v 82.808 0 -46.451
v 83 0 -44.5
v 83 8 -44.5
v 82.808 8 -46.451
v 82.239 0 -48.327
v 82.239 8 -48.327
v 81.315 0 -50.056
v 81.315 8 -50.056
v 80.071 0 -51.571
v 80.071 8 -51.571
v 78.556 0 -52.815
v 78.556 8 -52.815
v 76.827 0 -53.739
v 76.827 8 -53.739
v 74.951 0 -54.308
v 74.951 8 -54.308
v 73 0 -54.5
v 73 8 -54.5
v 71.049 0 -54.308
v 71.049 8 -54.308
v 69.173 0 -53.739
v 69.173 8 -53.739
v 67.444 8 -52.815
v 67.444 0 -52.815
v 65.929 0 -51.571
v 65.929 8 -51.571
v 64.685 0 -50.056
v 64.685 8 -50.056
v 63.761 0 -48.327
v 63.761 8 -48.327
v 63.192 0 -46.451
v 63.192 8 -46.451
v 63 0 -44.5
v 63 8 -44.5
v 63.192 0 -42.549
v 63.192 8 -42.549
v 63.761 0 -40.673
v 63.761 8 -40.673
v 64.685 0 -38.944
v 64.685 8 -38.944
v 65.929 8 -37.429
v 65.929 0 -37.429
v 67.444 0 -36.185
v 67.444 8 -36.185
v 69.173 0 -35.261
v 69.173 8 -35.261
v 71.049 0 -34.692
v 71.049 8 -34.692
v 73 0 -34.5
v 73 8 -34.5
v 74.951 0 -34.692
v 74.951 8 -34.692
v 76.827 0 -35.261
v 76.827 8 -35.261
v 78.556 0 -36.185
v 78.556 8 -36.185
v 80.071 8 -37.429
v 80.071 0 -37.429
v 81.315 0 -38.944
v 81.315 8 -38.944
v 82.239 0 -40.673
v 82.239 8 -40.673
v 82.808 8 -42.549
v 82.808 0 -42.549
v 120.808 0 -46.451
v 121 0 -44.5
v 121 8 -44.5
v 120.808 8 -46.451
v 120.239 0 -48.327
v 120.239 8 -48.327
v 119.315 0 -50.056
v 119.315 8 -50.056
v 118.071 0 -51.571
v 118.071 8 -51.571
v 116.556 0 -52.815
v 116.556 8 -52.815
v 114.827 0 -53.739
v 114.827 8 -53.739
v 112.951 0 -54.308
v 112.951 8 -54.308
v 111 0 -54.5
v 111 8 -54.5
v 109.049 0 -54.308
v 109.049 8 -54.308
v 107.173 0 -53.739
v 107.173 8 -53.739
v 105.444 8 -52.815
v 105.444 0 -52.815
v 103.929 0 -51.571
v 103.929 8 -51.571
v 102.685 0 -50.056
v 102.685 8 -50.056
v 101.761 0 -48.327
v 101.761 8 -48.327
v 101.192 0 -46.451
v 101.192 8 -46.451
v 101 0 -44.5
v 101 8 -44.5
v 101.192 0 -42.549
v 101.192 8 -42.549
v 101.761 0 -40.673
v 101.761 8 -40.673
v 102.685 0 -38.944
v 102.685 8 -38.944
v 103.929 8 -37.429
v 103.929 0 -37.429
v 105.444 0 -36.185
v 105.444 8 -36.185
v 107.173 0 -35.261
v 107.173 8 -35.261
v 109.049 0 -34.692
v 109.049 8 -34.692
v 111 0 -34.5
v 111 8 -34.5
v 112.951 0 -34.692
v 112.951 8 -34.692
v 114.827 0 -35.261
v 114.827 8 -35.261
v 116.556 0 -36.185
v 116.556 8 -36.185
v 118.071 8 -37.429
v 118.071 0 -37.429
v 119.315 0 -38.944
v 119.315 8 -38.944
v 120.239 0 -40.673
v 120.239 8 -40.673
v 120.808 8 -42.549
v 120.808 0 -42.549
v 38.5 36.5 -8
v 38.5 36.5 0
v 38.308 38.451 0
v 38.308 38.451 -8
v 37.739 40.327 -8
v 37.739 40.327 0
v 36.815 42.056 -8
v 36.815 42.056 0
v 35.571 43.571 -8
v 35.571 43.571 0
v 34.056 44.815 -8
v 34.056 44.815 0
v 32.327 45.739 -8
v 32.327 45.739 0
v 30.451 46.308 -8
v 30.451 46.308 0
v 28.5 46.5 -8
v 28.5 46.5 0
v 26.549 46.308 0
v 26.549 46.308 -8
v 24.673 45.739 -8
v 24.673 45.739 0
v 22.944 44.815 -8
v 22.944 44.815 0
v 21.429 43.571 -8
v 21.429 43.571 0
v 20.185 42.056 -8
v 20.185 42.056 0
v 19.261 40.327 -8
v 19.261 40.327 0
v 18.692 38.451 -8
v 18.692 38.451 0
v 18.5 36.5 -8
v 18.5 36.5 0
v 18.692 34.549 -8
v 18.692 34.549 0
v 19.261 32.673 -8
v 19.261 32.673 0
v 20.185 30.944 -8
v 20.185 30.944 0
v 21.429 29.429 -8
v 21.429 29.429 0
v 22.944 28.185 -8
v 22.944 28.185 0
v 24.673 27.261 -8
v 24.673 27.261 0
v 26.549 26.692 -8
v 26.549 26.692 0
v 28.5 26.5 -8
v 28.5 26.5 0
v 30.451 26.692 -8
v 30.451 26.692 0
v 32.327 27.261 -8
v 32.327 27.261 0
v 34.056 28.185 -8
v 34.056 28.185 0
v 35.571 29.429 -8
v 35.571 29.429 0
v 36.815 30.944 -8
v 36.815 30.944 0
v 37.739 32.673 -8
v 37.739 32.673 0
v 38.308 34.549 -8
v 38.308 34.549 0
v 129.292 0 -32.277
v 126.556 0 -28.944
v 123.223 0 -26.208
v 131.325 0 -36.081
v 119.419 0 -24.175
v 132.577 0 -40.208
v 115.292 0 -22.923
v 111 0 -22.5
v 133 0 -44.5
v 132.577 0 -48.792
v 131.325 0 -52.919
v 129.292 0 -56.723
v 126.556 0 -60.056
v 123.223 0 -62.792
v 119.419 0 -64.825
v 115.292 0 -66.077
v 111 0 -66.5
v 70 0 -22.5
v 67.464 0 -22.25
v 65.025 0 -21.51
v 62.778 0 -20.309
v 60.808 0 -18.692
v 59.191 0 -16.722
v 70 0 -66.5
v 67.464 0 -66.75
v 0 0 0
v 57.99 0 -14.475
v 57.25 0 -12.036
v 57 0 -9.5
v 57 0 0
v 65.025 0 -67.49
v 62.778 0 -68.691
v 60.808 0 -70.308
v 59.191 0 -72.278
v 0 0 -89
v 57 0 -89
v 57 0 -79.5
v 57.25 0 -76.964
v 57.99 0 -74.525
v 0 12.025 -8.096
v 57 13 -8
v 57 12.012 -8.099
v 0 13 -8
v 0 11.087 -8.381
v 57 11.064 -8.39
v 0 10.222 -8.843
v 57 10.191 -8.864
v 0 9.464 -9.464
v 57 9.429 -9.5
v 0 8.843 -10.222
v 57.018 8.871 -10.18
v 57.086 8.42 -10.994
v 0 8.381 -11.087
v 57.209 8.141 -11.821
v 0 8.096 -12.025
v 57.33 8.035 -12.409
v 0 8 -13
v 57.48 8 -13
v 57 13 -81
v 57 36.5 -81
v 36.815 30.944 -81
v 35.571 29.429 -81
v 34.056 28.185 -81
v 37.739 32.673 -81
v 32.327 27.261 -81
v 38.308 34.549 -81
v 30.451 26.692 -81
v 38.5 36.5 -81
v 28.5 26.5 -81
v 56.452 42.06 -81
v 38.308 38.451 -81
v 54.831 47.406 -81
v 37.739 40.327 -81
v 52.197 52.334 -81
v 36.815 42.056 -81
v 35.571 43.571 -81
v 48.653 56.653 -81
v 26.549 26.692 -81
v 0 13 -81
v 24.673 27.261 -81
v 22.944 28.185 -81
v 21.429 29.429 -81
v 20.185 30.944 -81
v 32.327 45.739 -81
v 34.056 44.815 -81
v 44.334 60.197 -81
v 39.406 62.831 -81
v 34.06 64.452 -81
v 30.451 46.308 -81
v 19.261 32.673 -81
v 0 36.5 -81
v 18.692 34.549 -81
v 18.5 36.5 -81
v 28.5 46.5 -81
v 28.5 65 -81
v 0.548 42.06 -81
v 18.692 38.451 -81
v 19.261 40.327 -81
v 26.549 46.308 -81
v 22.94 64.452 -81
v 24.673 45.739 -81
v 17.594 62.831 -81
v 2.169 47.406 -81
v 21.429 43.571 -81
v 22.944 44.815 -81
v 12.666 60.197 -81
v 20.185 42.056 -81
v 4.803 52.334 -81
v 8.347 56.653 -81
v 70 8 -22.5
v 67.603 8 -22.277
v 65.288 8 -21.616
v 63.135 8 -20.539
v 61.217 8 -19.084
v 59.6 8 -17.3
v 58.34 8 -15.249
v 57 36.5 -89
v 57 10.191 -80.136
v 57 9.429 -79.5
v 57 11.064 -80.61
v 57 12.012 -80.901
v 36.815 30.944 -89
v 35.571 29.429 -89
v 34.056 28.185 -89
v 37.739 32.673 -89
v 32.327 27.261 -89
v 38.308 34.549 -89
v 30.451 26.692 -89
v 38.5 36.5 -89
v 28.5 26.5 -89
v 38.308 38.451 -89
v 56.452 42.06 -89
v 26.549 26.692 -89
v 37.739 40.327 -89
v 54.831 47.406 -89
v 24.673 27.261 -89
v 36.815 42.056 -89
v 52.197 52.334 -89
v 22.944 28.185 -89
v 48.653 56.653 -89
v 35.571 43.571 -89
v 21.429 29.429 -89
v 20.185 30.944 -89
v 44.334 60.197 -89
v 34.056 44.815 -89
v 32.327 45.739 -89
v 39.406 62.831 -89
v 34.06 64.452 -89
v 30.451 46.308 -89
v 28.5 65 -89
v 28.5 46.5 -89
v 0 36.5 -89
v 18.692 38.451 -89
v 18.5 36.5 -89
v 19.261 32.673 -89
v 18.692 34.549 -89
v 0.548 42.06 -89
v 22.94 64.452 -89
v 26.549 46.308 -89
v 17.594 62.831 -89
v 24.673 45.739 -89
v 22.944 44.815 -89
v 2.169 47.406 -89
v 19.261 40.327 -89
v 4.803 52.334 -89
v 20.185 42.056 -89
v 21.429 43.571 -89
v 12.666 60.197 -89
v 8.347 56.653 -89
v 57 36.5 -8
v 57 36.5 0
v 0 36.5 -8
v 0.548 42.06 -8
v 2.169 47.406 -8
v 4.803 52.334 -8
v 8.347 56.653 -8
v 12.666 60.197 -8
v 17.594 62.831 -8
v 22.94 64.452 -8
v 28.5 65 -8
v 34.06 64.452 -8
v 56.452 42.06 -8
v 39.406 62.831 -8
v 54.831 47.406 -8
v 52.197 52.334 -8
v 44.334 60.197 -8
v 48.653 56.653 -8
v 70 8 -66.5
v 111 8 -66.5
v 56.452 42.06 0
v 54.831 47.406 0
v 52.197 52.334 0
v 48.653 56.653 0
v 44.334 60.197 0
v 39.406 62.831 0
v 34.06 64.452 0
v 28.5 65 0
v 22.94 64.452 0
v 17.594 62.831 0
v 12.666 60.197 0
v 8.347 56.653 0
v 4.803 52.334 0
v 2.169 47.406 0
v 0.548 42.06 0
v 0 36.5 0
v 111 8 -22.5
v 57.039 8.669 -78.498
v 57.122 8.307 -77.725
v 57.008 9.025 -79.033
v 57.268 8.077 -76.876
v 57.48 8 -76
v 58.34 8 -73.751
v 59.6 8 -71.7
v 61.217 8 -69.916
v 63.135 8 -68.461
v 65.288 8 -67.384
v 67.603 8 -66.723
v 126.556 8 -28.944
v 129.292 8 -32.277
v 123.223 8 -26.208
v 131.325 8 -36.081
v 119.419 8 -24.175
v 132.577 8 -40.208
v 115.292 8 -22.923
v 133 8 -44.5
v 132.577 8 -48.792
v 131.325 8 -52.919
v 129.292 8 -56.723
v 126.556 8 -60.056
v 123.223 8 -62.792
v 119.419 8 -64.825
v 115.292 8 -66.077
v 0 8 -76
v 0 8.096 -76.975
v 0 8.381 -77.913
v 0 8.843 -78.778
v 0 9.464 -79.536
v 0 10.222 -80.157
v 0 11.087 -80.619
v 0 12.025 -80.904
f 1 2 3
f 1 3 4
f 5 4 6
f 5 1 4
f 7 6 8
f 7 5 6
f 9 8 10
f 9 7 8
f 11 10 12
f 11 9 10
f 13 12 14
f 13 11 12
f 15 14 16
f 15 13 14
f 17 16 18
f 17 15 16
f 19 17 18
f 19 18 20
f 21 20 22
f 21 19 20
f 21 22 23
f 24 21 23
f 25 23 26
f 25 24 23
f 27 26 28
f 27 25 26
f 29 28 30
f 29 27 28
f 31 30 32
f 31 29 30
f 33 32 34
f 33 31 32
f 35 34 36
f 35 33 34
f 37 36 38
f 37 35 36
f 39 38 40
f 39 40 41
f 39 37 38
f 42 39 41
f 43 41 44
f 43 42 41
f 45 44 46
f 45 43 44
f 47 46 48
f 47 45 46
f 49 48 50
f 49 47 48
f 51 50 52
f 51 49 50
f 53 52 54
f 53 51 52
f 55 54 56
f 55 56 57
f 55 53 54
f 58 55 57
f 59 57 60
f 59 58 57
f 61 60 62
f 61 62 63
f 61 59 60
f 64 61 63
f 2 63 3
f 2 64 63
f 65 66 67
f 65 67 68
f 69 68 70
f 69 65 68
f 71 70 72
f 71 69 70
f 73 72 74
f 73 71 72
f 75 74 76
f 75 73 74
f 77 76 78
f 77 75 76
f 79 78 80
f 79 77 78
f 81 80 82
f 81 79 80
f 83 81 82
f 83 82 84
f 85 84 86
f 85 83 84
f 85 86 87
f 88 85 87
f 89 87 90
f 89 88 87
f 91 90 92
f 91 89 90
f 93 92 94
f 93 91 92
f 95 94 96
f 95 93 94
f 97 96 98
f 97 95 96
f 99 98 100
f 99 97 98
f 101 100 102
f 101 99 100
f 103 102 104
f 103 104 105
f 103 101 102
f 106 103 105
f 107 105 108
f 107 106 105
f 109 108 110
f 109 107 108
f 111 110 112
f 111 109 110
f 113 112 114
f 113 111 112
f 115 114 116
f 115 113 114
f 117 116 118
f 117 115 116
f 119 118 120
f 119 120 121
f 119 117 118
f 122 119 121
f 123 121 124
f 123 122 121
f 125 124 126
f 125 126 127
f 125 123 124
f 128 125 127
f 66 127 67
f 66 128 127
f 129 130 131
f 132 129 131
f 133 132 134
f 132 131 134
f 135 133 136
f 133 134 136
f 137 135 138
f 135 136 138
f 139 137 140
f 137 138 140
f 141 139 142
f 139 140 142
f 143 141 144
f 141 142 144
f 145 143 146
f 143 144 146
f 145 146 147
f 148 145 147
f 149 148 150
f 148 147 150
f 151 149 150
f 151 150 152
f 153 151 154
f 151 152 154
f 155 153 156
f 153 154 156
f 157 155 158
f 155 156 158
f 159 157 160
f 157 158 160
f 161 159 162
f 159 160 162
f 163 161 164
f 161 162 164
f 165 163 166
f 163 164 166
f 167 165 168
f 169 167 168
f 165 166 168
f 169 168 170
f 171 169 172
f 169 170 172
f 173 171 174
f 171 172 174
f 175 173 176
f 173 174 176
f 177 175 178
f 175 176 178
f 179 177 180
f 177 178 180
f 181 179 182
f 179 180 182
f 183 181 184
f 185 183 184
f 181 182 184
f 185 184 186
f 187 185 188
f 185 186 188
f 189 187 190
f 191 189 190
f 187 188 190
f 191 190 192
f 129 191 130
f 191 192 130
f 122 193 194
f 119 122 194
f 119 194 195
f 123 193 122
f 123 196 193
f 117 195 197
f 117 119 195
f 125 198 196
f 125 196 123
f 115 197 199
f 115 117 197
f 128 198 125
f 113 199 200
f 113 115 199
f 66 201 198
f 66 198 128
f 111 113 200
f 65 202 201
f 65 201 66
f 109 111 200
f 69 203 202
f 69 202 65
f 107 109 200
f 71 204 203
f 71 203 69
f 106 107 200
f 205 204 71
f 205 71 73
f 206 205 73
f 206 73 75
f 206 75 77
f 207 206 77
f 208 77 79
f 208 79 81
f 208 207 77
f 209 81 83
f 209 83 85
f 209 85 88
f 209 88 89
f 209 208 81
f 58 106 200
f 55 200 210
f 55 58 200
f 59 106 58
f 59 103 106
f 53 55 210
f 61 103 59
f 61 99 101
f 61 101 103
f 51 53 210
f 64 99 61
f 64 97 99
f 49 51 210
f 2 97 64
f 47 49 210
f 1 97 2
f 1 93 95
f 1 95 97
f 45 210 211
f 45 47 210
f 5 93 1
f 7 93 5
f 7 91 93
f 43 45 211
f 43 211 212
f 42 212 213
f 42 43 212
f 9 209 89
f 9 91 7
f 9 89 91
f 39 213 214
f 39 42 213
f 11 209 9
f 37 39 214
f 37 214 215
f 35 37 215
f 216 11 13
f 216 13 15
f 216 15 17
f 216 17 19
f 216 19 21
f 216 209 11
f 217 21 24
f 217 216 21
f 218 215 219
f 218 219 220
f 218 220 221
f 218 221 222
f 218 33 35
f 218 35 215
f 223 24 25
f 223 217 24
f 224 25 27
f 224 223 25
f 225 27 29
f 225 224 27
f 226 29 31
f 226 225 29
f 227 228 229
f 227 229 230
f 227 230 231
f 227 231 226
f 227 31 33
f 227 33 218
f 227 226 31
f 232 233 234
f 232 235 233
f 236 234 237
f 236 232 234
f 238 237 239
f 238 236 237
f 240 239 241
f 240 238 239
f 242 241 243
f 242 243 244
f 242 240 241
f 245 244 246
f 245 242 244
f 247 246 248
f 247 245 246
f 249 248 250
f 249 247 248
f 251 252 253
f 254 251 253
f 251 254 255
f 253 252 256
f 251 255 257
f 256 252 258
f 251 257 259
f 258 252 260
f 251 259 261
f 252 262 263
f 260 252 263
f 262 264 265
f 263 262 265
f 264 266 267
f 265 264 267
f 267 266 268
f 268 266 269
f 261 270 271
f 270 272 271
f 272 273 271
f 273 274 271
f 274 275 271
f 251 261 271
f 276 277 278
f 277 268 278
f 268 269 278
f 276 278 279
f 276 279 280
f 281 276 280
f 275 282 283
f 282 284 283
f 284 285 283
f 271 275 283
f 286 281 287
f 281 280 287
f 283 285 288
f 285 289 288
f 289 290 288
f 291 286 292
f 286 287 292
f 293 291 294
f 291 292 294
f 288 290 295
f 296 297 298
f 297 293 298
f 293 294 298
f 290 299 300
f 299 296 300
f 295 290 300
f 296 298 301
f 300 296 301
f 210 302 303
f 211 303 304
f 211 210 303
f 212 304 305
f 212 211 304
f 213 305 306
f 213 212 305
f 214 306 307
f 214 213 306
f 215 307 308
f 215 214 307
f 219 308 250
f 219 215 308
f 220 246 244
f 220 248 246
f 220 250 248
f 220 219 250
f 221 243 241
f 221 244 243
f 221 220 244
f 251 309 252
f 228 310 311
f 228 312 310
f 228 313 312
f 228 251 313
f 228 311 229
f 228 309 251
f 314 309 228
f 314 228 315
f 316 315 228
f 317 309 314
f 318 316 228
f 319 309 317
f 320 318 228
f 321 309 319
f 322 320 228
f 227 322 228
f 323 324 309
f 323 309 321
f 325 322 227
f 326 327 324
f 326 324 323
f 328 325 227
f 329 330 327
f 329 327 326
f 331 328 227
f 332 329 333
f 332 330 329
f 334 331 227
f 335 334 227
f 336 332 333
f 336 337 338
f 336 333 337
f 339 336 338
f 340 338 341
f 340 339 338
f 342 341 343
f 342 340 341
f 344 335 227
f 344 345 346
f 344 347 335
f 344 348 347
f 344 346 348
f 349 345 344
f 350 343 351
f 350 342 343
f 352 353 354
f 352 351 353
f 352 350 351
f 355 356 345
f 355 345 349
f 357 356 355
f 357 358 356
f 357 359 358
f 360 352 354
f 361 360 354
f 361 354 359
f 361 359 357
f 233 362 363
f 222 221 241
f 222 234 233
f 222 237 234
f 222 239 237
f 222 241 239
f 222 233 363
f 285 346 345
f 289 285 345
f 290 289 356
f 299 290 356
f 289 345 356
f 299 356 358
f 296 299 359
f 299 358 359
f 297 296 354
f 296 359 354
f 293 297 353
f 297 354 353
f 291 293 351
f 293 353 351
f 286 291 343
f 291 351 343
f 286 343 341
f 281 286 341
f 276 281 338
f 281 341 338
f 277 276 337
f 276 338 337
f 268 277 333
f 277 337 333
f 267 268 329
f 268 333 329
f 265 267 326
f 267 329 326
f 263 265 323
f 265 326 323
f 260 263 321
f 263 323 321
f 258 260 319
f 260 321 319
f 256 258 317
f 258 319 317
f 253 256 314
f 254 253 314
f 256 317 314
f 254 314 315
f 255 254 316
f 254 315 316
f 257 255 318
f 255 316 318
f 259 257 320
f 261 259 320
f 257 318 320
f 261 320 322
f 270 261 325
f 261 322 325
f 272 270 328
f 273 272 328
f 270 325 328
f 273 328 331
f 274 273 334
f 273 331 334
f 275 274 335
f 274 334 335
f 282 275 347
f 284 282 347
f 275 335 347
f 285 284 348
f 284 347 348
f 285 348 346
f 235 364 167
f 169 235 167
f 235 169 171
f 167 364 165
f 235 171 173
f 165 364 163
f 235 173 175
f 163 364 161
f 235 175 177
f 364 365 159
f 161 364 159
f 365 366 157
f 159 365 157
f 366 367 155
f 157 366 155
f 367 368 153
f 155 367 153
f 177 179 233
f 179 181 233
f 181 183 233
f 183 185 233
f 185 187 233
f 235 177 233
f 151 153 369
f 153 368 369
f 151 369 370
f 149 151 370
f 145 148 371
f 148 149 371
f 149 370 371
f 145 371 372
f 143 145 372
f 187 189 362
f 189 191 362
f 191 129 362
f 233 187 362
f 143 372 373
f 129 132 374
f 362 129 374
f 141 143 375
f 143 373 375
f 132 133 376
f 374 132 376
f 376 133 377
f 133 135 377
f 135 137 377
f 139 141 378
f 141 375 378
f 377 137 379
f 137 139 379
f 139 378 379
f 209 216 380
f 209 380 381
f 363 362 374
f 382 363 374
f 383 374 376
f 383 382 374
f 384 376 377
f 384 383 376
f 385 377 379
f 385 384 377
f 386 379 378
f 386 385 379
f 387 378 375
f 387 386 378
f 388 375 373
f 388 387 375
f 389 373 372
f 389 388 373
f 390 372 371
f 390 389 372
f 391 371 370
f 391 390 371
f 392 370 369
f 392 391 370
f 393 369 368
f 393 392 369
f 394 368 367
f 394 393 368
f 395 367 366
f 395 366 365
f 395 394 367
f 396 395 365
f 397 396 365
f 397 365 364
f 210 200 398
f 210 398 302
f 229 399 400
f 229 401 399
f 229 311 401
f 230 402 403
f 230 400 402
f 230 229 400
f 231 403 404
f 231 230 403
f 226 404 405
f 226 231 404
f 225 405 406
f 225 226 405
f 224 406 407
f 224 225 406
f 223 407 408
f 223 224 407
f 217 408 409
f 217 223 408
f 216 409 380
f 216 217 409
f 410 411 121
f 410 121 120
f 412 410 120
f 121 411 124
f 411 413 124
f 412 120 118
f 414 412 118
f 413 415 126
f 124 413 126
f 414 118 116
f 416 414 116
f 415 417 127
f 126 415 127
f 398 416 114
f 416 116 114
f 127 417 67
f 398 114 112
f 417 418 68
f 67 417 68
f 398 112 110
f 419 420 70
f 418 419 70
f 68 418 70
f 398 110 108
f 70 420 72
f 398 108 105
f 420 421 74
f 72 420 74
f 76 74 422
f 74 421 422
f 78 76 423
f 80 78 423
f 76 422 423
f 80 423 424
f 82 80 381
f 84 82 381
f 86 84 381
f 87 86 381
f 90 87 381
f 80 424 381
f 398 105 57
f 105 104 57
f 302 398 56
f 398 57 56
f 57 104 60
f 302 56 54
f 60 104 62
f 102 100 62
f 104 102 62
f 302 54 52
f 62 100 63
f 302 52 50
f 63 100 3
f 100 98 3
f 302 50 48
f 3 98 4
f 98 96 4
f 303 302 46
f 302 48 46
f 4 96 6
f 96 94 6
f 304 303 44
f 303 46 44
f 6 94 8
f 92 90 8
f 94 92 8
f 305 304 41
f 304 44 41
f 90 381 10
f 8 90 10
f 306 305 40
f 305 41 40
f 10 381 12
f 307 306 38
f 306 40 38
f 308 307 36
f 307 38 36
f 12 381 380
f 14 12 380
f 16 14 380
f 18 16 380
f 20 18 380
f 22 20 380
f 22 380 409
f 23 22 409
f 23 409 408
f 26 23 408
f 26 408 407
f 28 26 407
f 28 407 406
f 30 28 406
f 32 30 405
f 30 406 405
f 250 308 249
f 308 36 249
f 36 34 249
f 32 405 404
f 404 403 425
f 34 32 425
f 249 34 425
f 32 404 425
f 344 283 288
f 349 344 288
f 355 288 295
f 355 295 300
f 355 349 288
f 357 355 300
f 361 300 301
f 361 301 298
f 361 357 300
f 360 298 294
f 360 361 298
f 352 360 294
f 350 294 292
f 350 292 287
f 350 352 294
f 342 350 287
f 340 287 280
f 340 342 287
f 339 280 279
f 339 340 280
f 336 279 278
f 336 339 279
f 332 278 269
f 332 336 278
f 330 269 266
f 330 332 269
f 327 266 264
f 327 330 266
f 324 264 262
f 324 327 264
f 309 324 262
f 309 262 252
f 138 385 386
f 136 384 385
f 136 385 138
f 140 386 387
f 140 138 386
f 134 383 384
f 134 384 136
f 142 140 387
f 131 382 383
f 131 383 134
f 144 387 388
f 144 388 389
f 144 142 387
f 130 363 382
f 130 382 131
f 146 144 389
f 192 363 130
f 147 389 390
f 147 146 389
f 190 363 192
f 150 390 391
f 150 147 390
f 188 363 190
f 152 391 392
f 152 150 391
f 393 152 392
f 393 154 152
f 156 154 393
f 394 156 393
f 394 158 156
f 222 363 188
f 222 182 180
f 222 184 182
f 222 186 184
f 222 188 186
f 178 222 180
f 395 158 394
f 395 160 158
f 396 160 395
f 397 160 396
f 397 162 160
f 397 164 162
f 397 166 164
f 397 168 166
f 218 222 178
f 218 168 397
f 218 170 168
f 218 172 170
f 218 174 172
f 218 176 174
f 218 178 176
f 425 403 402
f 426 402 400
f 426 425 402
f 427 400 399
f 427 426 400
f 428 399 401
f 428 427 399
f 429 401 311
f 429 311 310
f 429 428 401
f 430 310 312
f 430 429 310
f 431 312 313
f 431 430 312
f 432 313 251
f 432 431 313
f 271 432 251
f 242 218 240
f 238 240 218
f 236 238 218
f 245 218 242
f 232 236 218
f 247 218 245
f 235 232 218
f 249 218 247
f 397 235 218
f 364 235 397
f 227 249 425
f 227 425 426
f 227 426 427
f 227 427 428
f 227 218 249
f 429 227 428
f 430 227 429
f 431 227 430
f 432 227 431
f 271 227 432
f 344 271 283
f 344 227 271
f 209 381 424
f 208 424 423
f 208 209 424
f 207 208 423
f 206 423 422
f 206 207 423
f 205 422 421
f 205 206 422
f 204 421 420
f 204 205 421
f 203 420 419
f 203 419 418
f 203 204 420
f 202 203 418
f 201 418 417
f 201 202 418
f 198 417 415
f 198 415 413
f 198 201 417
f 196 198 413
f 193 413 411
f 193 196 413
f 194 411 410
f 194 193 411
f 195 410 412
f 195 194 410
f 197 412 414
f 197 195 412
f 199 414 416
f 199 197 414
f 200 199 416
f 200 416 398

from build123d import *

# Parameters (mm, degrees)
SKETCH2_R           = 10
BOSS_EXTRUDE1_DEPTH = 8
SKETCH3_R           = 10
BOSS_EXTRUDE2_DEPTH = 8
SKETCH4_R           = 10
BOSS_EXTRUDE3_DEPTH = 8
FILLET1_R           = 5


with BuildPart() as part:
    # Sketch2 → Boss-Extrude1 (new body)
    with BuildSketch(Plane(origin=(0, 0, 0), x_dir=(1, 0, 0), z_dir=(0, 1, 0))):
        with BuildLine():
            Line((0, 0), (0, 89))
            Line((0, 89), (57, 89))
            Line((57, 89), (57, 79.5))
            ThreePointArc((57, 79.5), (60.807611845, 70.307611845), (70, 66.5))
            Line((70, 66.5), (111, 66.5))
            ThreePointArc((111, 66.5), (133, 44.5), (111, 22.5))
            Line((111, 22.5), (70, 22.5))
            ThreePointArc((70, 22.5), (60.807611845, 18.692388155), (57, 9.5))
            Line((57, 9.5), (57, 0))
            Line((57, 0), (0, 0))
        make_face()
        with Locations((73, 44.5)):
            Circle(SKETCH2_R, mode=Mode.SUBTRACT)
        with Locations((111, 44.5)):
            Circle(SKETCH2_R, mode=Mode.SUBTRACT)
    extrude(amount=BOSS_EXTRUDE1_DEPTH)

    # Sketch3 → Boss-Extrude2 (add)
    with BuildSketch(Plane.XY):
        with BuildLine():
            Line((0, 0), (57, 0))
            Line((57, 0), (57, 36.5))
            ThreePointArc((57, 36.5), (28.5, 65), (0, 36.5))
            Line((0, 36.5), (0, 0))
        make_face()
        with Locations((28.5, 36.5)):
            Circle(SKETCH3_R, mode=Mode.SUBTRACT)
    extrude(amount=-BOSS_EXTRUDE2_DEPTH)

    # Sketch4 → Boss-Extrude3 (add)
    with BuildSketch(Plane(origin=(0, 0, -89), x_dir=(-1, 0, 0), z_dir=(0, 0, -1))):
        with BuildLine():
            Line((-57, 8), (0, 8))
            Line((0, 8), (0, 36.5))
            ThreePointArc((0, 36.5), (-28.5, 65), (-57, 36.5))
            Line((-57, 36.5), (-57, 8))
        make_face()
        with Locations((-28.5, 36.5)):
            Circle(SKETCH4_R, mode=Mode.SUBTRACT)
    extrude(amount=-BOSS_EXTRUDE3_DEPTH)

    # Fillet1
    fillet1_edges = [part.edges().sort_by_distance(p)[0] for p in [
        (28.5, 8, -8),
        (28.5, 8, -81),
    ]]
    fillet(fillet1_edges, radius=FILLET1_R)


solid = part.part
